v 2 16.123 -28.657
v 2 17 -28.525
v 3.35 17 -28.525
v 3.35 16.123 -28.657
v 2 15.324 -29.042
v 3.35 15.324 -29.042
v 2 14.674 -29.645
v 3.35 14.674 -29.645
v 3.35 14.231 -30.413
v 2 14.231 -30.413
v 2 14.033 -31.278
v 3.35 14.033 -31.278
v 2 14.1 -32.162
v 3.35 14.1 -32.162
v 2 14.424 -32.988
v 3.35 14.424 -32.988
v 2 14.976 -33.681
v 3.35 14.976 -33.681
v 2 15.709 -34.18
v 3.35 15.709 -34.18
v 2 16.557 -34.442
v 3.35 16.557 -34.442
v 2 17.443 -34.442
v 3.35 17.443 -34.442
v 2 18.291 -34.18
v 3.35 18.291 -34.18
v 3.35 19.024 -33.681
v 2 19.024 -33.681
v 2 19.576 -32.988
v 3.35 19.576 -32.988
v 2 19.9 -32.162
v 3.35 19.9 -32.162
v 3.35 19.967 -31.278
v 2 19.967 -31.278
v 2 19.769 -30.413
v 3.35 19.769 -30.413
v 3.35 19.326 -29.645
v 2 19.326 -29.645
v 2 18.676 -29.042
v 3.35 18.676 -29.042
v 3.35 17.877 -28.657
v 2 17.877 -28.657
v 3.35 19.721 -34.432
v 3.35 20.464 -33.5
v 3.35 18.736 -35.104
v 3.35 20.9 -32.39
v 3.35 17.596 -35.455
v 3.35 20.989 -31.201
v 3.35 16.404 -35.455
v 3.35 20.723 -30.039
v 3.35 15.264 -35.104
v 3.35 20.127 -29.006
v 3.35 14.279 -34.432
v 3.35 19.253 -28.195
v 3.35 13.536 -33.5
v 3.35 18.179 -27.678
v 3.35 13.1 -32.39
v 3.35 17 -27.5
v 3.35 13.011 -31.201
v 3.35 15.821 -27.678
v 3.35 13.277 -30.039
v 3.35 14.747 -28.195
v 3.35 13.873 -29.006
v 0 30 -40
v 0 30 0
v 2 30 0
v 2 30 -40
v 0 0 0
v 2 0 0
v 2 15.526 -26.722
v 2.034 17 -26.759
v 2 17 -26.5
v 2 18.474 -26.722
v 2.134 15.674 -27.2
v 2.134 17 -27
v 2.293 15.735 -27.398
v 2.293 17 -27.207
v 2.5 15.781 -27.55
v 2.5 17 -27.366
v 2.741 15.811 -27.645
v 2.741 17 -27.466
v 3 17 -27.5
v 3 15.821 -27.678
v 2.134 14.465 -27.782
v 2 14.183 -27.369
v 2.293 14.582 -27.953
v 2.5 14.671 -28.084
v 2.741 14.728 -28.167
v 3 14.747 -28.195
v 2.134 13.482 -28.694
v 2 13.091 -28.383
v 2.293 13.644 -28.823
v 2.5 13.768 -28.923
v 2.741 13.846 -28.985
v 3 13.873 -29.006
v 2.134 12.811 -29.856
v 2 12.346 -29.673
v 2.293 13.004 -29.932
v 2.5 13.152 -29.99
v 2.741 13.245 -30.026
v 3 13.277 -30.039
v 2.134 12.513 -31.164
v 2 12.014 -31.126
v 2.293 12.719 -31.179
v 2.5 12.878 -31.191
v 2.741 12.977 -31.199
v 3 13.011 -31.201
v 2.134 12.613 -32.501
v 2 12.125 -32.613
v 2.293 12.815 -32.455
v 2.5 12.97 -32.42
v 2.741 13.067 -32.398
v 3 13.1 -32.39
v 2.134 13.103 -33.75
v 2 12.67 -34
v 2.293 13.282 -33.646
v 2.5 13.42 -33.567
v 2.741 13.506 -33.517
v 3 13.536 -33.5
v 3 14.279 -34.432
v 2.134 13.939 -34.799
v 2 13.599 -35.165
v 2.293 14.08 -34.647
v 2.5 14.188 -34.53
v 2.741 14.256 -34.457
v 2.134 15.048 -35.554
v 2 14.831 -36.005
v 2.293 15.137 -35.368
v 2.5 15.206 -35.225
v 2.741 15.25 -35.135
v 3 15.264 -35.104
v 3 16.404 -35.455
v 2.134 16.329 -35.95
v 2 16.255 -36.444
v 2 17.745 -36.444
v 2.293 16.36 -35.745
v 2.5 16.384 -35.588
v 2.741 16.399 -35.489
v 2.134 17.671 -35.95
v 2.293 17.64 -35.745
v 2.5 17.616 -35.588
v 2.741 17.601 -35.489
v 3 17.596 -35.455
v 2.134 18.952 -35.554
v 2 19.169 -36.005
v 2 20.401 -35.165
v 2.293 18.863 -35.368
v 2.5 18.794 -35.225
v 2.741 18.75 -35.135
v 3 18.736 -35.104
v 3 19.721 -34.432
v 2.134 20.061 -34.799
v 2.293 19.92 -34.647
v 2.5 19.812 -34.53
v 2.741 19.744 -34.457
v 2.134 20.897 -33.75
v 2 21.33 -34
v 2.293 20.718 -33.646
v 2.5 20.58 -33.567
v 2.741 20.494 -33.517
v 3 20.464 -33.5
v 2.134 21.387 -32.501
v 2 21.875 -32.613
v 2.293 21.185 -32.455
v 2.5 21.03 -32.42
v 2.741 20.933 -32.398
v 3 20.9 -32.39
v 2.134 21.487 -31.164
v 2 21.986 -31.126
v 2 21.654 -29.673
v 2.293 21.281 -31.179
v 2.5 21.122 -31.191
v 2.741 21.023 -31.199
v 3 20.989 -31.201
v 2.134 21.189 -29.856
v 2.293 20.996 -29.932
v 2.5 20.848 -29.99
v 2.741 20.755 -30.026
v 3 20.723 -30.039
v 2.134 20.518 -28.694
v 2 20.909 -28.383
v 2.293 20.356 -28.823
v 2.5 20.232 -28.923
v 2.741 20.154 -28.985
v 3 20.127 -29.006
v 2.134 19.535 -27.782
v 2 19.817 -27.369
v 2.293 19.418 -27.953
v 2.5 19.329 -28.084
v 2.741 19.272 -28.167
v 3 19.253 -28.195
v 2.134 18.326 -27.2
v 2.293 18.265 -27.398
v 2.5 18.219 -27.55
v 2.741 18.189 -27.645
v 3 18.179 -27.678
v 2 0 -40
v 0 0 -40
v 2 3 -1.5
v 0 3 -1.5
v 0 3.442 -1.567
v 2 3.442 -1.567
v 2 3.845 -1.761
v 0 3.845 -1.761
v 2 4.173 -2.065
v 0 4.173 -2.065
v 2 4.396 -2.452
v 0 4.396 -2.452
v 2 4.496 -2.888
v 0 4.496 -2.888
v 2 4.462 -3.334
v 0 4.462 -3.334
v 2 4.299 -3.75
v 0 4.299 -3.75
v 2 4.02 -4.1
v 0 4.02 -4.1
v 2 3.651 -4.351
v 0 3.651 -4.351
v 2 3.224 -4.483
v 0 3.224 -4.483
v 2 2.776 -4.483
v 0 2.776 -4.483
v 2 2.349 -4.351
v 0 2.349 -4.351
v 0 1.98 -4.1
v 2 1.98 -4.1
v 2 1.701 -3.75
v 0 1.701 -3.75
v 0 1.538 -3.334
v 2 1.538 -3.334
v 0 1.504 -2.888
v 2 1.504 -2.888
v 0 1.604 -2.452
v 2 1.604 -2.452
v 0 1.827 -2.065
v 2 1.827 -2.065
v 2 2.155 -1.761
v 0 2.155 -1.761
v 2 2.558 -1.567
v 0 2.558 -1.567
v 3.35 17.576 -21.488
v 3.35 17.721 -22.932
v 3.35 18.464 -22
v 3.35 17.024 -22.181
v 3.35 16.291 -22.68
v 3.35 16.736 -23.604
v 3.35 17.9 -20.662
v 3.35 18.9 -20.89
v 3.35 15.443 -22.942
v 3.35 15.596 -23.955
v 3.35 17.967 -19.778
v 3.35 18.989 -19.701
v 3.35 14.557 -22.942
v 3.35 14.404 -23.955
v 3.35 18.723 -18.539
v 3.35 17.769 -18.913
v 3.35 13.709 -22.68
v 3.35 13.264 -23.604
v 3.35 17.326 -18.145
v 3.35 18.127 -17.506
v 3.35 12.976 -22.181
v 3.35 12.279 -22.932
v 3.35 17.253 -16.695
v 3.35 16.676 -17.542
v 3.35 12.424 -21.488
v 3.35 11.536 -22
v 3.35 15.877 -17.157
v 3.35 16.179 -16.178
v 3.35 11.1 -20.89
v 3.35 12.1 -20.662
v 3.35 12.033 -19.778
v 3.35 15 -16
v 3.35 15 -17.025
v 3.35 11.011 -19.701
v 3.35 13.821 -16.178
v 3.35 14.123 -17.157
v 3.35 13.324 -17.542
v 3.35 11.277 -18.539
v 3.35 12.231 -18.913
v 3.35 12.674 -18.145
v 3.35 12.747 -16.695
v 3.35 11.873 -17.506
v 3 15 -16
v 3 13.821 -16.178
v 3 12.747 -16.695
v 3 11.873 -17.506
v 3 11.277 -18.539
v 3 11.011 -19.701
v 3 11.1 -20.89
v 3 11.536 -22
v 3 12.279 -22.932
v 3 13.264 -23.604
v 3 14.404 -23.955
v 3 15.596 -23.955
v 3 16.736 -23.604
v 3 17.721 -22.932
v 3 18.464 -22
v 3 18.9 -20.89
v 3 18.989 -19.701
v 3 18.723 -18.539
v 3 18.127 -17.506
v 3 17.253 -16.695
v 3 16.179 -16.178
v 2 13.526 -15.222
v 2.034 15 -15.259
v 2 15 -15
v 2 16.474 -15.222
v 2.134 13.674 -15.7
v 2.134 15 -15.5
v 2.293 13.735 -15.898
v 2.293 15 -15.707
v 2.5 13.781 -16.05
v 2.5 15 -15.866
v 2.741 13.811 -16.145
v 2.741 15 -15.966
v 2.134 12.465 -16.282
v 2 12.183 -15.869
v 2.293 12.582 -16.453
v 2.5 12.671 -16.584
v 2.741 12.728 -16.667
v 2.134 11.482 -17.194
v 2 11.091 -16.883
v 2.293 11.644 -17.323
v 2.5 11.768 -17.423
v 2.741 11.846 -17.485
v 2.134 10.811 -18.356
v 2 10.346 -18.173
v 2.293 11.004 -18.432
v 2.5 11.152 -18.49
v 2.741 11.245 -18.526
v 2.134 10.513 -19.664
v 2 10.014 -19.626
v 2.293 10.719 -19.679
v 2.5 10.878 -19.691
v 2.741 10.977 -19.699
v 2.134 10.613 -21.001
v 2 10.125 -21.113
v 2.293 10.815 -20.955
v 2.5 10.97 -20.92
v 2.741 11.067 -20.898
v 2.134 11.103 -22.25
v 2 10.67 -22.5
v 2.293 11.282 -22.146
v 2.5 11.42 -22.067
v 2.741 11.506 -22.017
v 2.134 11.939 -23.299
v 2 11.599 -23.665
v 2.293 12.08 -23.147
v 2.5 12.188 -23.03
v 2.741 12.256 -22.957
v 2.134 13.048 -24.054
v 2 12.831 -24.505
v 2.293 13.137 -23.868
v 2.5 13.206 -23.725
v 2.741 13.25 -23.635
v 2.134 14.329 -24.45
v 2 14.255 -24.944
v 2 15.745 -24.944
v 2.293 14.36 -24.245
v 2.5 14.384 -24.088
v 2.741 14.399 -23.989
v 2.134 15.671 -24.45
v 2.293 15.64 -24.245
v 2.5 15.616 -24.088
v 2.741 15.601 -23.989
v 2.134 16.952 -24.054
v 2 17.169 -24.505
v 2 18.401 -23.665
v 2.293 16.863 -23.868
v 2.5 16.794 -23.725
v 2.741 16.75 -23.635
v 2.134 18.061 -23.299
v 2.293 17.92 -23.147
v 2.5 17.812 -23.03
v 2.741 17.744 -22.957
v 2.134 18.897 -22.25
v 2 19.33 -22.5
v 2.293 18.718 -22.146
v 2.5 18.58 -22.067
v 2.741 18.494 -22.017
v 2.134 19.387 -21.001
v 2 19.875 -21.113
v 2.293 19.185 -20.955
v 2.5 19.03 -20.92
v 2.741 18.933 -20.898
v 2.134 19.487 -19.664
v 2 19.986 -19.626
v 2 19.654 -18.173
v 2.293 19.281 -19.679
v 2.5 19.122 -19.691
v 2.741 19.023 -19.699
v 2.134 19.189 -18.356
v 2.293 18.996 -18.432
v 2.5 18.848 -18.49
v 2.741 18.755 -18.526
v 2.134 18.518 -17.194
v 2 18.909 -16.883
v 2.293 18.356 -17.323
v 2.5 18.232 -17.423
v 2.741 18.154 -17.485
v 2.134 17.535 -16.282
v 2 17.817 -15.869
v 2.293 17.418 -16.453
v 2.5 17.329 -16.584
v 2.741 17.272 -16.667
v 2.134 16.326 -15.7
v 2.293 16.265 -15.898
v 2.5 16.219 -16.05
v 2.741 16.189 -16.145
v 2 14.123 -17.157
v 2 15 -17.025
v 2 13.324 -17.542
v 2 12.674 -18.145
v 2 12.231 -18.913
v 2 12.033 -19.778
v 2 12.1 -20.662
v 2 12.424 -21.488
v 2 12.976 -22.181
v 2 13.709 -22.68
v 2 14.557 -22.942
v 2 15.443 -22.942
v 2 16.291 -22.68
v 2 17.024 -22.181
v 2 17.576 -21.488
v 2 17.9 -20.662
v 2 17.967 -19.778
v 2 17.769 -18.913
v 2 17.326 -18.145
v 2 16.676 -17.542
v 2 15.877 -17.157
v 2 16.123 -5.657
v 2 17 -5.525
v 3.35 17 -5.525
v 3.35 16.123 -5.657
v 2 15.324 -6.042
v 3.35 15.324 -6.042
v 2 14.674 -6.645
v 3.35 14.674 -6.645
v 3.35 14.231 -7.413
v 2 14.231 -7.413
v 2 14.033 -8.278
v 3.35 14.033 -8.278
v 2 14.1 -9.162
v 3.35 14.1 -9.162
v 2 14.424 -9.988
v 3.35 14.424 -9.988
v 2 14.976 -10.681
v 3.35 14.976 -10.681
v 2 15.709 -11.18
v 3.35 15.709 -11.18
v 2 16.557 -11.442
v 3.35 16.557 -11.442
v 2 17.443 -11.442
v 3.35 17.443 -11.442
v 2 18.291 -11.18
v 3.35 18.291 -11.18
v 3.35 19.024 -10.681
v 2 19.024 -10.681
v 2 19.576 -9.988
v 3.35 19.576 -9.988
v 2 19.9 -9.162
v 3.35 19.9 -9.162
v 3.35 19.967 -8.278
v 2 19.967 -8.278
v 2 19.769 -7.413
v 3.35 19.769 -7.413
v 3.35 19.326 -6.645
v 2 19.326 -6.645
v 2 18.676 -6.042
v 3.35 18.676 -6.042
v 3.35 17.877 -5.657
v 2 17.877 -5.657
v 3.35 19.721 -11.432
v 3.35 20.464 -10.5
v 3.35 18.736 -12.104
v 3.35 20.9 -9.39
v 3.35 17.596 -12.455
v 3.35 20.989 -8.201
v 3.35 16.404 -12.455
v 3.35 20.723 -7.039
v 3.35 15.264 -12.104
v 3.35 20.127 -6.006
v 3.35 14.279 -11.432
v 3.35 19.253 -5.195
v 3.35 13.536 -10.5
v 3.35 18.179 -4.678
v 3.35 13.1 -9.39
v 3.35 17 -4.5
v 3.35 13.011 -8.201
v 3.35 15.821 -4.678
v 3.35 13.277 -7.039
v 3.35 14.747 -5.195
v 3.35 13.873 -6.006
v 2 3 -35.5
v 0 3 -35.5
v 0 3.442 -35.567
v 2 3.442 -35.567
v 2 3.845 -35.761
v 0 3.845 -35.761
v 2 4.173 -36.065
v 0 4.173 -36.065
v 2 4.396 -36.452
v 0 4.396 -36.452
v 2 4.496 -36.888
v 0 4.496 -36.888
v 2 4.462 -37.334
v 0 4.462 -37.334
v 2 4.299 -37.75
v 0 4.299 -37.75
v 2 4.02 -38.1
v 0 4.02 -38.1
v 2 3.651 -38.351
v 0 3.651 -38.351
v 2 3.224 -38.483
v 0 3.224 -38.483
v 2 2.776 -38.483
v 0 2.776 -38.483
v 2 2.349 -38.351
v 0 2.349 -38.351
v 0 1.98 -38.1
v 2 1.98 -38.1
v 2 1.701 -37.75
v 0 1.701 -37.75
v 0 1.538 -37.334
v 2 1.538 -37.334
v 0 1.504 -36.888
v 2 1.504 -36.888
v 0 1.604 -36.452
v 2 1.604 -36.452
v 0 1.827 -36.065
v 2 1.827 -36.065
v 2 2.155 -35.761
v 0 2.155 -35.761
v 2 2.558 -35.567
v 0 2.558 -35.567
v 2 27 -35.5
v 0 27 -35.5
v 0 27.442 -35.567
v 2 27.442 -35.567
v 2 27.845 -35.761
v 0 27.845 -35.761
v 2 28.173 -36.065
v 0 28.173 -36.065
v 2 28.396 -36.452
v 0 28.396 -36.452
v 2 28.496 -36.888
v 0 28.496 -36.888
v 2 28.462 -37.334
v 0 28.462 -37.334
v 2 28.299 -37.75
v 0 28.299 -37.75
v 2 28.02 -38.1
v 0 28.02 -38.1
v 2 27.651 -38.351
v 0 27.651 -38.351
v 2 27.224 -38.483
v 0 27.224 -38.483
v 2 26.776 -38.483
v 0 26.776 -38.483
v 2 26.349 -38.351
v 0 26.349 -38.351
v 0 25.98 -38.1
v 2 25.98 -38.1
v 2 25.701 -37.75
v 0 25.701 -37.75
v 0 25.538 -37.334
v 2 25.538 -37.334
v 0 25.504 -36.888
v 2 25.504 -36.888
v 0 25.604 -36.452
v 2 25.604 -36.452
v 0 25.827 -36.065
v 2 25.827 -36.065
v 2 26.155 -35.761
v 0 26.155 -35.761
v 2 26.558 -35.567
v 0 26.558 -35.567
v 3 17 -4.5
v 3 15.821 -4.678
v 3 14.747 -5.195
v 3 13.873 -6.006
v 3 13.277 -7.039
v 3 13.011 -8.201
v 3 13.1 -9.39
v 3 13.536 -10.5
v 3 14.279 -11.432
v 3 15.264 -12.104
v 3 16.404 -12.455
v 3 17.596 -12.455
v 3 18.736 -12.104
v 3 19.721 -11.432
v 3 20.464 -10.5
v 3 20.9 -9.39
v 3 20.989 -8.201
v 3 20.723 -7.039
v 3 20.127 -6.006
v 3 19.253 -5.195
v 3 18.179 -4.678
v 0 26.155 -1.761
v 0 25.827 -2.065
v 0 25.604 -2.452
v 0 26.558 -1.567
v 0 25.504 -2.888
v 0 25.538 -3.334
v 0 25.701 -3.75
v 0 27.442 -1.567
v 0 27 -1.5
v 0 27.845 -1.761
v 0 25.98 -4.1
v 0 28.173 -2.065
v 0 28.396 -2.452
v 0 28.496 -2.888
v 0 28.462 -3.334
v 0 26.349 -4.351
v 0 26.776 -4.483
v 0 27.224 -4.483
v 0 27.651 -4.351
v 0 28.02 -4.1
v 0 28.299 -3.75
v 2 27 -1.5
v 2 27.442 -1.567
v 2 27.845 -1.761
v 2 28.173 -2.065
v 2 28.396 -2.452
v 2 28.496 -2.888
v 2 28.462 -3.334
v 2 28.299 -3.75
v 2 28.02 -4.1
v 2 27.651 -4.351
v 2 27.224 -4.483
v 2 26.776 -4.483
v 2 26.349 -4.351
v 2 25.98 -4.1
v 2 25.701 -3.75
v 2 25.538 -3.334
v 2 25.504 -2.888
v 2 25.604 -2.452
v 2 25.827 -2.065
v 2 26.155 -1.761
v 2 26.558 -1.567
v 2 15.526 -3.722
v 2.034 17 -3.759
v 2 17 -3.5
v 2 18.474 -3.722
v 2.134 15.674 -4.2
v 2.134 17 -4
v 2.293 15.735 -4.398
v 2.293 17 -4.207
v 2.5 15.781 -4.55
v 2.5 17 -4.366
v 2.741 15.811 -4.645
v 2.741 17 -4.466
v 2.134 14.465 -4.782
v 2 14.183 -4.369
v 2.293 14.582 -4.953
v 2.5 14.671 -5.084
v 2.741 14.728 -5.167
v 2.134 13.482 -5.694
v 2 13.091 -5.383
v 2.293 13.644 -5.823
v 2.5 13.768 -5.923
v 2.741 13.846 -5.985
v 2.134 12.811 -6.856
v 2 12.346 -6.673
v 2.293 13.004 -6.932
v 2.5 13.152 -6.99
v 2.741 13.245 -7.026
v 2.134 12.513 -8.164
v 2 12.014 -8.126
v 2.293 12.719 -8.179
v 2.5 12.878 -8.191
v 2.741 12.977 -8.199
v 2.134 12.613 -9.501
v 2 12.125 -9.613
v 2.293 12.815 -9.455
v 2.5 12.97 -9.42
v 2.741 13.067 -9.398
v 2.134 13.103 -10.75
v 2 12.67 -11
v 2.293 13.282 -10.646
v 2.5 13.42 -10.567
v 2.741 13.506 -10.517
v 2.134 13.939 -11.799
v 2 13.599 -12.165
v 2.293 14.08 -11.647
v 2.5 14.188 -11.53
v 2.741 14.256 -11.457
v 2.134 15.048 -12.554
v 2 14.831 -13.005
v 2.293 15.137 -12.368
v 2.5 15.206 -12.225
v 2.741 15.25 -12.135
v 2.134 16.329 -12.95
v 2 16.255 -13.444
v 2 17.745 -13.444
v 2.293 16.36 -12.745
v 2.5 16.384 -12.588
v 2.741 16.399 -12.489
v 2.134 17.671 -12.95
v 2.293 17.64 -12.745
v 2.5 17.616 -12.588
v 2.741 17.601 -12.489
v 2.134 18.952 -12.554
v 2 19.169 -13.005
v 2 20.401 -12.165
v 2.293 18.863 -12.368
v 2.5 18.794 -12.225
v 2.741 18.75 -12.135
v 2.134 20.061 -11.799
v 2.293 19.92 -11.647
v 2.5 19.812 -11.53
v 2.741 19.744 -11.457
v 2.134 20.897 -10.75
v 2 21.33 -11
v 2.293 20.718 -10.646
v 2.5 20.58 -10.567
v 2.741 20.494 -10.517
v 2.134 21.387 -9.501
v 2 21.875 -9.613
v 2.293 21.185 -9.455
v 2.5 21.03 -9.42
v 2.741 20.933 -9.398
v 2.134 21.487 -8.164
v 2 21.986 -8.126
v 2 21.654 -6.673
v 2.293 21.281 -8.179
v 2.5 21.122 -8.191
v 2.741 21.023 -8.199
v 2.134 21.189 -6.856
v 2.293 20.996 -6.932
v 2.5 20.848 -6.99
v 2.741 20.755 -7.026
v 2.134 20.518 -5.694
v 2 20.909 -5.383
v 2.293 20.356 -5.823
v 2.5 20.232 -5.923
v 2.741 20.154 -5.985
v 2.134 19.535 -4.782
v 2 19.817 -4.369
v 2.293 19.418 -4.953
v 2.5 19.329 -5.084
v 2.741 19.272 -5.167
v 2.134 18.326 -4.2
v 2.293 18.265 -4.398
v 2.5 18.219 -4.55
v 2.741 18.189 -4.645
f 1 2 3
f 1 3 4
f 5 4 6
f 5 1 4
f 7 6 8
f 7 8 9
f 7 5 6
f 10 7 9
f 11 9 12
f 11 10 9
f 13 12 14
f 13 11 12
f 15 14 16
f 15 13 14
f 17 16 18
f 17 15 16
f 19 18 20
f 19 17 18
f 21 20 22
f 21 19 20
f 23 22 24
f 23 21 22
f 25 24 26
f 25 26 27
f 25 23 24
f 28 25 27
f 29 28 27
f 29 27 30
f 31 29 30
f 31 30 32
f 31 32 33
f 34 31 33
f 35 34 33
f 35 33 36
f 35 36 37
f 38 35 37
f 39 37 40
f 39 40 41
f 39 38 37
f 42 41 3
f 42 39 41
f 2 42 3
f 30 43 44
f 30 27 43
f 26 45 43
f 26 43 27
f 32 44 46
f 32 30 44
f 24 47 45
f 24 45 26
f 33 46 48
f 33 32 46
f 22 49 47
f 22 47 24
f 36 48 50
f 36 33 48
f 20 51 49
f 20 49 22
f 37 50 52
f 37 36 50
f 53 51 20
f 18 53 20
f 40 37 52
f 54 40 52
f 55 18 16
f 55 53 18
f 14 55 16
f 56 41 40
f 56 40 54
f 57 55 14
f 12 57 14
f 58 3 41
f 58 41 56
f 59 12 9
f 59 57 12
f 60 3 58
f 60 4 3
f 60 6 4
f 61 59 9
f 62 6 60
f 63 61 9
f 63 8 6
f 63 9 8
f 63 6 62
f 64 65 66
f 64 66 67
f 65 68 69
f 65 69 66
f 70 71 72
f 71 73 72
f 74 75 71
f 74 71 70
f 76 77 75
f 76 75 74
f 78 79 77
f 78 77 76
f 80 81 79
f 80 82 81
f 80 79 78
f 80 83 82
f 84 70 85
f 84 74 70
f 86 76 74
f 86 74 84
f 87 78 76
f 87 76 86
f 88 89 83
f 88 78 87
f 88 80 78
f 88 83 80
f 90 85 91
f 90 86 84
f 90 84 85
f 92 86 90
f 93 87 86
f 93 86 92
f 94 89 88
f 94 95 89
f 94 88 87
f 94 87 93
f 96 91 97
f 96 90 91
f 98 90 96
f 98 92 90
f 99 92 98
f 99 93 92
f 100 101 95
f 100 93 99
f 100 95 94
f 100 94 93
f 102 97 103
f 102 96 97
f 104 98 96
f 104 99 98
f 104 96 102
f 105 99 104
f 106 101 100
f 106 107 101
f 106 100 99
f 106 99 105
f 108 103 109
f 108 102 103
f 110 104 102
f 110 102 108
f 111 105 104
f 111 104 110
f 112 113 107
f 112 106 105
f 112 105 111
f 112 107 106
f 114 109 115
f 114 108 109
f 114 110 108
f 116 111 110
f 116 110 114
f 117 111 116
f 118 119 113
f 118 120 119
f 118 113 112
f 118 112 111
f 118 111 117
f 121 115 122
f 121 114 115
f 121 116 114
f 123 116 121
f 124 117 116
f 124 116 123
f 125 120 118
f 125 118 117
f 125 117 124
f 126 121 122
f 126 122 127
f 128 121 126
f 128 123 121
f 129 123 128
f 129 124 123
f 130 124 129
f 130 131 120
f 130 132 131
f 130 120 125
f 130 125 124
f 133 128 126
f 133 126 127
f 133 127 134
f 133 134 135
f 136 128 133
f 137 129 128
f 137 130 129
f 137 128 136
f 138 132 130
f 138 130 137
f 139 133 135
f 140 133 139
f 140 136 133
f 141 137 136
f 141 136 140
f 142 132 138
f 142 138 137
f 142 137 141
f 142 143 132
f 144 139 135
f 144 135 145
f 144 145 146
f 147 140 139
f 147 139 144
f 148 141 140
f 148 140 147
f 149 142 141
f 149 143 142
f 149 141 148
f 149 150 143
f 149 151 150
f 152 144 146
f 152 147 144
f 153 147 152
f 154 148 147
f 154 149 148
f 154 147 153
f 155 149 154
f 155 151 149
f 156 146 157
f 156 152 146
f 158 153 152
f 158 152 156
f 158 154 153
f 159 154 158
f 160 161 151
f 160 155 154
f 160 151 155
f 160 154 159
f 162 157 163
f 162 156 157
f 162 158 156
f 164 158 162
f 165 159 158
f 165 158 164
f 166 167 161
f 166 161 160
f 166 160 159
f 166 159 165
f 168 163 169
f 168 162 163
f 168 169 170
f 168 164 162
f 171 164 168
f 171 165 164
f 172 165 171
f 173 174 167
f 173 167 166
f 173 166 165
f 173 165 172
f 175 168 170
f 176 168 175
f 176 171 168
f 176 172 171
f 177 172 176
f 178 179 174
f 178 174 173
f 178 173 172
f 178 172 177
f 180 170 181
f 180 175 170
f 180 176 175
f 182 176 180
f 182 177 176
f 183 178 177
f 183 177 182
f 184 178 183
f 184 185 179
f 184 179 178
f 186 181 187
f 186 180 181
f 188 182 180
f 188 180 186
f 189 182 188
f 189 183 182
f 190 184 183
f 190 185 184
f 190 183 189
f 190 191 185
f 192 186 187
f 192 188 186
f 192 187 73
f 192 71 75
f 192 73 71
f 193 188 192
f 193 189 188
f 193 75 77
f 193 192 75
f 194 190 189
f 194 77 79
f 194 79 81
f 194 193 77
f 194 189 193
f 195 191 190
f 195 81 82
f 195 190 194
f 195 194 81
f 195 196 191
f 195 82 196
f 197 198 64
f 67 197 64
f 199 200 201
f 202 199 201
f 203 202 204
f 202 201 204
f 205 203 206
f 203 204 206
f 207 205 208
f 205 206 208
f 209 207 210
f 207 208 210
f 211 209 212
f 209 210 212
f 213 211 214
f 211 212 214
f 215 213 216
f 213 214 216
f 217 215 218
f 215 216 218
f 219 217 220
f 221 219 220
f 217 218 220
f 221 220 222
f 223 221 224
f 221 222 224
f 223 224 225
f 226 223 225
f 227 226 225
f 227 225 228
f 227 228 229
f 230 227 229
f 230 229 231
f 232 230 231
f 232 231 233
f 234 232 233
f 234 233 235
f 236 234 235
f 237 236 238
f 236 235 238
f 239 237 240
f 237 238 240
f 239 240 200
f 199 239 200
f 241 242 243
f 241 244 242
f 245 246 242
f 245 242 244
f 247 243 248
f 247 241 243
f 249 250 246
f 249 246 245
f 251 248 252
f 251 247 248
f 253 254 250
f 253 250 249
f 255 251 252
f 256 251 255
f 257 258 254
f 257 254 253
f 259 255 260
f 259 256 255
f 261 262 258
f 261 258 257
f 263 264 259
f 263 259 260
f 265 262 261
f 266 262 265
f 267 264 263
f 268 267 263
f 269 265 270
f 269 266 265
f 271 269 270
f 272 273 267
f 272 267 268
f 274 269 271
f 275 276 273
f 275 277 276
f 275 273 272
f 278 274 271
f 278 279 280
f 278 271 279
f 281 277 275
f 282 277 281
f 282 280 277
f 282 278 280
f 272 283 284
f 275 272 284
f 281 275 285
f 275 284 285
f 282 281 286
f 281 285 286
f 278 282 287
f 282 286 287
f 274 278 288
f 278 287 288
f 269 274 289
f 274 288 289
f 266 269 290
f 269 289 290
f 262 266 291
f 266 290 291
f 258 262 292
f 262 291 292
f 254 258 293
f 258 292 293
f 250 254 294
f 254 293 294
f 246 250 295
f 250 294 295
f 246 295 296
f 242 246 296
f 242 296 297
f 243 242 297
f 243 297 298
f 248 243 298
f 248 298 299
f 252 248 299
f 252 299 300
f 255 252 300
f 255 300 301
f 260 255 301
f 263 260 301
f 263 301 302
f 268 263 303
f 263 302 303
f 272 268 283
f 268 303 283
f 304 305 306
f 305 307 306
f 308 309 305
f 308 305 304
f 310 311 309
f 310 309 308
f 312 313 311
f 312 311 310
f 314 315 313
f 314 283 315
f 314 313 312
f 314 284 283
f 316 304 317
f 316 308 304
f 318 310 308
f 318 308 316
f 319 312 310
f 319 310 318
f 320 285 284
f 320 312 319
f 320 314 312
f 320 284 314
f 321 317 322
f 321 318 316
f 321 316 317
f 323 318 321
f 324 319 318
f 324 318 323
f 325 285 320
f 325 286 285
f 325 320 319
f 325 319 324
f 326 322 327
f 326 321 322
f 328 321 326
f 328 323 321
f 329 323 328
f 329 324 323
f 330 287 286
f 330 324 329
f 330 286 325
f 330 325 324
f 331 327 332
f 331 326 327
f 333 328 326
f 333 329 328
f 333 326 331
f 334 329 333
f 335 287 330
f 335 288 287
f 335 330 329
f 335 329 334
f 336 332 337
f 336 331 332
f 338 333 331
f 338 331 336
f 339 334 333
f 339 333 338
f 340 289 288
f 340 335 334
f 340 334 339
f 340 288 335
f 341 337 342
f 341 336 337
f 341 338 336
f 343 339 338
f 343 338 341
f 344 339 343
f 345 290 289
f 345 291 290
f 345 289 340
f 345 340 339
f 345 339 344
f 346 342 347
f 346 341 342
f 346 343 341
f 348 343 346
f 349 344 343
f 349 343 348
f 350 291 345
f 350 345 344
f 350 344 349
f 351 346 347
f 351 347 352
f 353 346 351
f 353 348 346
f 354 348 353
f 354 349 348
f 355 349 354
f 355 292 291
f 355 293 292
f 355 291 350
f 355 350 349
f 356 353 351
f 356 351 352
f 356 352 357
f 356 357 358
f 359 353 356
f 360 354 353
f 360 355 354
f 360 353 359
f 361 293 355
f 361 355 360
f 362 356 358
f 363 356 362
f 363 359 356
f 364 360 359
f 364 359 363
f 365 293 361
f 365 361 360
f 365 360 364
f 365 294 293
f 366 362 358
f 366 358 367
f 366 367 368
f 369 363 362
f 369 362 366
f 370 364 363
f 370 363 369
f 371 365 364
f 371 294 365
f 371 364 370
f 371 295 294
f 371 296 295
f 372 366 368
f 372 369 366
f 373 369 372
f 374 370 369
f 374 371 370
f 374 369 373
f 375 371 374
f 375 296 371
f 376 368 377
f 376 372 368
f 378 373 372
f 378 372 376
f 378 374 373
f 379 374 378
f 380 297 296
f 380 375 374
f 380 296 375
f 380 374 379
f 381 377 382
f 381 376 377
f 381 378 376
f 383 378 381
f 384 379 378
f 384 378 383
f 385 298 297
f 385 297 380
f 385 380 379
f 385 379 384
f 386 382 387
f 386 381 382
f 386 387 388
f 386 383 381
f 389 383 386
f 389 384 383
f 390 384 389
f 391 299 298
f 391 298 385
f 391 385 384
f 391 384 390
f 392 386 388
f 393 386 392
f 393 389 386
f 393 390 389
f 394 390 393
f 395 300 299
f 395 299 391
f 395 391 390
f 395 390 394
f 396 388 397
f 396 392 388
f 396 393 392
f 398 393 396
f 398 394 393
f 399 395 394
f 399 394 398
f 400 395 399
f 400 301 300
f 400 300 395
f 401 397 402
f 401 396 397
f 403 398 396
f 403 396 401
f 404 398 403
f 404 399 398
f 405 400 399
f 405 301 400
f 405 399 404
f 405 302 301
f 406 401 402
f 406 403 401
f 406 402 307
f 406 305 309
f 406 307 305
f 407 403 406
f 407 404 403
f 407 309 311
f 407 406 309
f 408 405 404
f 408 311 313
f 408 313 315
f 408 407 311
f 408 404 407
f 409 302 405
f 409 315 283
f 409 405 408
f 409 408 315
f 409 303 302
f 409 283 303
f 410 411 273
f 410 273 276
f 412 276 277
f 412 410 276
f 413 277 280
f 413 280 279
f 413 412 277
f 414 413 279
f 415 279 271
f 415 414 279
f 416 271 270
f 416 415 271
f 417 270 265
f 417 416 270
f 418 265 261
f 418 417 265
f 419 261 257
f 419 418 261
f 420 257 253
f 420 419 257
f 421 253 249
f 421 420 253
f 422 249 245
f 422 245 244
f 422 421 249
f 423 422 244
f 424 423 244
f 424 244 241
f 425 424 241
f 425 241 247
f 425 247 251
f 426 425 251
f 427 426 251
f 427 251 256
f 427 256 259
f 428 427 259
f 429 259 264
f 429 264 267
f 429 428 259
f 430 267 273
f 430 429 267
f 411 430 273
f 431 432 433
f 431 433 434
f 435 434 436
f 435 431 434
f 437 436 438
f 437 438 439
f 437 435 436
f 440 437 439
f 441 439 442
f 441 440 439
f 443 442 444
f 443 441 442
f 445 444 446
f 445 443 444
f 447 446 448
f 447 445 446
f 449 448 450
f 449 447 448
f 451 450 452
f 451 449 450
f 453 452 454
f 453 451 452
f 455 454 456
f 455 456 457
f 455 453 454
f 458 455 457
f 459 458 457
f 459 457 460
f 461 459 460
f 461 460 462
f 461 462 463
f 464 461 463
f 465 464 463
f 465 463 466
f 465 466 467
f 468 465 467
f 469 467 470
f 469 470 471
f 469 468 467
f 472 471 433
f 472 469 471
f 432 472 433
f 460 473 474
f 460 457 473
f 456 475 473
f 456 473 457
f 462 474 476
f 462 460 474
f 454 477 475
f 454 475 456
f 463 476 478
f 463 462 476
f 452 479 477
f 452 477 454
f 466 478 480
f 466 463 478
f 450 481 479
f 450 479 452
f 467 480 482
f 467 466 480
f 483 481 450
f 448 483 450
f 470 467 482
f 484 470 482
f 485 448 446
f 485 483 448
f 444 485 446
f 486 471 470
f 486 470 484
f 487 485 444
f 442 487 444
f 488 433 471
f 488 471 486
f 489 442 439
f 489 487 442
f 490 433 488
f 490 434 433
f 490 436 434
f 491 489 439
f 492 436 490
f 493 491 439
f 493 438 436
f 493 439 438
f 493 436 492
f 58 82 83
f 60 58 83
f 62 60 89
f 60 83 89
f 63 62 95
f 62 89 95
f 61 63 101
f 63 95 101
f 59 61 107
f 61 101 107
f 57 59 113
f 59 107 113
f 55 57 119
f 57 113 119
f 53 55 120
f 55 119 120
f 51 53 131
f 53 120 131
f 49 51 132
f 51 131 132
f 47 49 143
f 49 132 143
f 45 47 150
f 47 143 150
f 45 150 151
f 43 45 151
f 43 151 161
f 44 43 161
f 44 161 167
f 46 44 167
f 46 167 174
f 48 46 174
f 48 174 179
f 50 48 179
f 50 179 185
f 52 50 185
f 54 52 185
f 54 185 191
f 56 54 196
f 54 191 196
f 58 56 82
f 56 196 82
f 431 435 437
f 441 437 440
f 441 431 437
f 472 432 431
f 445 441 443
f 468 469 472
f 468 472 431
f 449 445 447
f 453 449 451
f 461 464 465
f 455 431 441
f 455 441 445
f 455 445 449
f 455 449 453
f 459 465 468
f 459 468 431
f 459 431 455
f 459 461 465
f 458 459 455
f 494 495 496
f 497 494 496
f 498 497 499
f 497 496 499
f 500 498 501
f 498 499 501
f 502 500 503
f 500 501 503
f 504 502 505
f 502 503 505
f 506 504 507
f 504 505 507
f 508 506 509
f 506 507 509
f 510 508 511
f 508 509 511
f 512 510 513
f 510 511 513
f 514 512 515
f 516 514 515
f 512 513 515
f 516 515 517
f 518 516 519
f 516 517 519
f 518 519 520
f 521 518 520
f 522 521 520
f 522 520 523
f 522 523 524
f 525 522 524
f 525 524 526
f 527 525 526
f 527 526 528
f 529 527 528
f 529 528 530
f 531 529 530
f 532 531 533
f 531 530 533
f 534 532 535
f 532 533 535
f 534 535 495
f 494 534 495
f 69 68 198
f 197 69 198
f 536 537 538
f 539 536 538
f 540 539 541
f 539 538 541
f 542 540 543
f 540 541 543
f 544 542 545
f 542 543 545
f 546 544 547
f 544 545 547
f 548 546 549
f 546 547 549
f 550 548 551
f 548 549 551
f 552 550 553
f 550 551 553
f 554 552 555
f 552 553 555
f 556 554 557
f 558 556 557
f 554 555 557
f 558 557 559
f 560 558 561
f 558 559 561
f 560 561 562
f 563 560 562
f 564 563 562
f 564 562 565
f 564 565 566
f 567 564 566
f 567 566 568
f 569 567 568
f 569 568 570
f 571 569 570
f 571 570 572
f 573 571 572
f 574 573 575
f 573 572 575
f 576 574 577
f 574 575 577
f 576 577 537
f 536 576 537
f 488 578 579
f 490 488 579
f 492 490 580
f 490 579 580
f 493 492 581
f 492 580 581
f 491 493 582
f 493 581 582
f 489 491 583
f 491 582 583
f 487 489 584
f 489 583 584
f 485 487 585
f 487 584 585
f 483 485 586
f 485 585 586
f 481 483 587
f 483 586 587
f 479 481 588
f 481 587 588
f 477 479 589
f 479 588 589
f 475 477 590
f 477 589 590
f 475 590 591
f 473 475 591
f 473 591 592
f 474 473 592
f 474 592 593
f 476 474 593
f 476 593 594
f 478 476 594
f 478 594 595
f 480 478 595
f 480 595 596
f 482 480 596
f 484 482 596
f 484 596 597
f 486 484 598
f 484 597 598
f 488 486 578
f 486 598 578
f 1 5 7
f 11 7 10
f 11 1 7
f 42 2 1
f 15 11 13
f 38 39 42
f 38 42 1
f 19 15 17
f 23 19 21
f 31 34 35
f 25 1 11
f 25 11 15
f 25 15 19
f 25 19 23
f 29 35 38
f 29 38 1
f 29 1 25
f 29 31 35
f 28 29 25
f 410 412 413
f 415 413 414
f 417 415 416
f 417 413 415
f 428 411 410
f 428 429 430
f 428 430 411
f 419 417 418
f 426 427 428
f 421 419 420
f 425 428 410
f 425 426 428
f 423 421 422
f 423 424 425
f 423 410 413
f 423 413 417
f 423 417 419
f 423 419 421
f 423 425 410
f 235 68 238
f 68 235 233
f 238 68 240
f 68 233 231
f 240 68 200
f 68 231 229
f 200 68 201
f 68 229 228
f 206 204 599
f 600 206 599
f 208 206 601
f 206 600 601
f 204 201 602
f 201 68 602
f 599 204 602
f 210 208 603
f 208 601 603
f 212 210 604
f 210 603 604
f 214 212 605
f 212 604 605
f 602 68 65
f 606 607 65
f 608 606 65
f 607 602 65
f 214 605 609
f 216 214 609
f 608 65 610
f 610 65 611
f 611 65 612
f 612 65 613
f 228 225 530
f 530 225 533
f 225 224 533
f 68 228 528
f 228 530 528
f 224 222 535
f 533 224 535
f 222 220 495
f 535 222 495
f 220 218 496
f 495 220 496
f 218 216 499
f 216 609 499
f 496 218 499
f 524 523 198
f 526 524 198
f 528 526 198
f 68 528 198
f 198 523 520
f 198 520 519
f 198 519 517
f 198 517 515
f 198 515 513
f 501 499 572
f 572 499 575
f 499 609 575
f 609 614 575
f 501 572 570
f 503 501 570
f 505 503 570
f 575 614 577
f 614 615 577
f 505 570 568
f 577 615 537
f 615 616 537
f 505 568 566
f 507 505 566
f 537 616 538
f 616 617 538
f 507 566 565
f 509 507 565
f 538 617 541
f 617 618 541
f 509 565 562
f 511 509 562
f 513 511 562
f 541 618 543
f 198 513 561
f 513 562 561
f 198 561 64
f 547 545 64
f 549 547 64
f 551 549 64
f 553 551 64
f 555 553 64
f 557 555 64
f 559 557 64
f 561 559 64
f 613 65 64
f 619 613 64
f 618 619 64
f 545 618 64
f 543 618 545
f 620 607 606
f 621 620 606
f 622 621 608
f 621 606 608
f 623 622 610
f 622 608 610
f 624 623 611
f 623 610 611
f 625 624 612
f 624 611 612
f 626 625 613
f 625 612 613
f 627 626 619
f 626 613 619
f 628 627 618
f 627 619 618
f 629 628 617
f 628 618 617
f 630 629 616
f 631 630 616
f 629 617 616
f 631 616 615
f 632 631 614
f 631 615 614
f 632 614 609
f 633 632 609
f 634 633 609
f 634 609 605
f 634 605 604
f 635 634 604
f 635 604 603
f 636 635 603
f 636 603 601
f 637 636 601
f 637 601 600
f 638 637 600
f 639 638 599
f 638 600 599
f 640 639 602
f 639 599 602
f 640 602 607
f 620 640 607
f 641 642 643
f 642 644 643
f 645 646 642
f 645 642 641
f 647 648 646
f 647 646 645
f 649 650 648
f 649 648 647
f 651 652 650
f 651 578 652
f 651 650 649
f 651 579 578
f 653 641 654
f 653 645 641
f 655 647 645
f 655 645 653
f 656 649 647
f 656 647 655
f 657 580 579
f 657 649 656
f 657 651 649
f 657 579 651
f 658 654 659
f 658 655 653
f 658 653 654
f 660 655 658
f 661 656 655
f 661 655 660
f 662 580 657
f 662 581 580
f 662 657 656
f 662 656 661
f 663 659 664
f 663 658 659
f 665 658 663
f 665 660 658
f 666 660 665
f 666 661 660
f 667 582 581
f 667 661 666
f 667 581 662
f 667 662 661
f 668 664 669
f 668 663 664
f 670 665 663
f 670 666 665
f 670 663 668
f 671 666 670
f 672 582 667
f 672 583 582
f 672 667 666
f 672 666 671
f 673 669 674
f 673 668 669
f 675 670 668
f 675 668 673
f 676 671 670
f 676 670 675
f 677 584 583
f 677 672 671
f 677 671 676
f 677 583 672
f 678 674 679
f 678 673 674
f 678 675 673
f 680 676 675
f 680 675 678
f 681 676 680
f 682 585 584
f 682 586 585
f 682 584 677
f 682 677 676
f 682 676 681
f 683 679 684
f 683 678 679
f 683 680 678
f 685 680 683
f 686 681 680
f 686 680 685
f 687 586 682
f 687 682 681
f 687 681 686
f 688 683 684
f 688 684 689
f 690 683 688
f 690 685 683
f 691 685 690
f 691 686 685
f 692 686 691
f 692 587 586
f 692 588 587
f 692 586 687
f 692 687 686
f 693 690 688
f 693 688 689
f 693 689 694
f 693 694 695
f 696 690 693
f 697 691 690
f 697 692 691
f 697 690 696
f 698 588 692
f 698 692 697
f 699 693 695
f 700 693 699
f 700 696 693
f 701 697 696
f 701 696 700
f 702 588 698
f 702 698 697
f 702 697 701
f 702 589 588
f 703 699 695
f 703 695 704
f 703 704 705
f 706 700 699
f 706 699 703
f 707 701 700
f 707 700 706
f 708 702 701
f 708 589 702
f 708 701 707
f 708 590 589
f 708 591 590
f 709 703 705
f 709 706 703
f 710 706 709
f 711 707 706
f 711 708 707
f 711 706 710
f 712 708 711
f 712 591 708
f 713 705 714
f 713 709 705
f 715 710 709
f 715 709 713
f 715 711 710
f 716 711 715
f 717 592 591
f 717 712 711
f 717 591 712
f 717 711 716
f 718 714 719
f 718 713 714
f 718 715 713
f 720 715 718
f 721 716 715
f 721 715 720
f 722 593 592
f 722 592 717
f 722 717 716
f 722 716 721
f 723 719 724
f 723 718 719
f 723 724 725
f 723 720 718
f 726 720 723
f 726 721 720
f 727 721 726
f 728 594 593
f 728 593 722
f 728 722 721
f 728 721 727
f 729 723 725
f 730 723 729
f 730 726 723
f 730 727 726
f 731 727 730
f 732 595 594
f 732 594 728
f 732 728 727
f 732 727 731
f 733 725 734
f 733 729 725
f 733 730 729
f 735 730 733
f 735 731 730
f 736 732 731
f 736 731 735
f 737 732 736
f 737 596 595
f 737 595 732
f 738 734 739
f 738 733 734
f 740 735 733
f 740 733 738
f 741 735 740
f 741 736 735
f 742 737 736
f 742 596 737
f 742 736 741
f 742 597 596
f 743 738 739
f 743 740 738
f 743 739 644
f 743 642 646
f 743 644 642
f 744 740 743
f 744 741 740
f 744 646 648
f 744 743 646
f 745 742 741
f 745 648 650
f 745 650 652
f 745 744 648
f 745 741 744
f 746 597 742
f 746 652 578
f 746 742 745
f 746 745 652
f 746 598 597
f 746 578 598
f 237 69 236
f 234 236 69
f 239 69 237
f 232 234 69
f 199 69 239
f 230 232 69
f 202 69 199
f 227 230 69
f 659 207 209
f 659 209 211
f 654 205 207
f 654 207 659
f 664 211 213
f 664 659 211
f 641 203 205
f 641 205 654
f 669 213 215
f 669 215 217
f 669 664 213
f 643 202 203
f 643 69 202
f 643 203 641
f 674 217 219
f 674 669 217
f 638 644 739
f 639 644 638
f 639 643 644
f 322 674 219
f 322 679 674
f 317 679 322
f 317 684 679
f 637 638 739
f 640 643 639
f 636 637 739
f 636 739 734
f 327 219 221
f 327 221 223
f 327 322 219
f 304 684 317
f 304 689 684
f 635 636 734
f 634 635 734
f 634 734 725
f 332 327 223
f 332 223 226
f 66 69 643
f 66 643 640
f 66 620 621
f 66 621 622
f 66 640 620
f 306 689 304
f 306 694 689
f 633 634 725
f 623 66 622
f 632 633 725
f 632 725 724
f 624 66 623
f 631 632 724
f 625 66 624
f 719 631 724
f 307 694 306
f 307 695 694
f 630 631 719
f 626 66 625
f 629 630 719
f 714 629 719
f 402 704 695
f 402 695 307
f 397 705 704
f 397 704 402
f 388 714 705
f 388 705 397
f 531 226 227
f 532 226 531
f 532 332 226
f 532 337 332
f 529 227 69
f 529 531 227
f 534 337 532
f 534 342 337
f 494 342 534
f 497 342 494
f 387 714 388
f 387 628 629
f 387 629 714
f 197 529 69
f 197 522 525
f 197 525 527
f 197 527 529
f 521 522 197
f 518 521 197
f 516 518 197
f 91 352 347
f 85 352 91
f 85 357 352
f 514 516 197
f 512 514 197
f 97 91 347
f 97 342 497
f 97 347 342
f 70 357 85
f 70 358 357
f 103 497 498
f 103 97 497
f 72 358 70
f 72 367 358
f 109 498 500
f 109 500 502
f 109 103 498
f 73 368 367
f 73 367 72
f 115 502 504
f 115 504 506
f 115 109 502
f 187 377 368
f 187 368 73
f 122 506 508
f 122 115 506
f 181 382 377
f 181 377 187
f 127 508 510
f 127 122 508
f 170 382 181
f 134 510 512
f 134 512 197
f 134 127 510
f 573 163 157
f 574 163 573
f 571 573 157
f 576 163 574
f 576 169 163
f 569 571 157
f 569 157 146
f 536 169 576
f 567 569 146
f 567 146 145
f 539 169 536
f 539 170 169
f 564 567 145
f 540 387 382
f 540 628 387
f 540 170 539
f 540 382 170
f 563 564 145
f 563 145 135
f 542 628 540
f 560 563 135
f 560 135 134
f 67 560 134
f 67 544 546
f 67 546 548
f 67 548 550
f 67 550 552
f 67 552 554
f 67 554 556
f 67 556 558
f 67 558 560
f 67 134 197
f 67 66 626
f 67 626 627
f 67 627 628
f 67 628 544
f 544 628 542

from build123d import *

# Parameters (mm, degrees)
SKETCH2_W           = 40
SKETCH2_H           = 30
BOSS_EXTRUDE1_DEPTH = 2
SKETCH3_R           = 4
SKETCH3_R_2         = 2.975
BOSS_EXTRUDE2_DEPTH = 1.35
FILLET1_R           = 1
SKETCH4_R           = 1.5
CUT_EXTRUDE1_DEPTH  = 2


with BuildPart() as part:
    # Sketch2 → Boss-Extrude1 (new body)
    with BuildSketch(Plane(origin=(0, 0, 0), x_dir=(0, 0, -1), z_dir=(1, 0, 0))):
        with Locations((20, 15)):
            Rectangle(SKETCH2_W, SKETCH2_H)
    extrude(amount=BOSS_EXTRUDE1_DEPTH)

    # Sketch3 → Boss-Extrude2 (add)
    # profile 1 of 3: a face of its own
    with BuildSketch(Plane(origin=(2, 0, 0), x_dir=(0, 0, -1), z_dir=(1, 0, 0))):
        with Locations(Location((8.5, 17, 0), (0, 0, 180))):
            Circle(SKETCH3_R)
        with Locations(Location((8.5, 17, 0), (0, 0, 180))):
            Circle(SKETCH3_R_2, mode=Mode.SUBTRACT)
    # profile 2 of 3: a face of its own
    with BuildSketch(Plane(origin=(2, 0, 0), x_dir=(0, 0, -1), z_dir=(1, 0, 0))):
        with Locations(Location((20, 15, 0), (0, 0, 180))):
            Circle(SKETCH3_R)
        with Locations(Location((20, 15, 0), (0, 0, 180))):
            Circle(SKETCH3_R_2, mode=Mode.SUBTRACT)
    # profile 3 of 3: a face of its own
    with BuildSketch(Plane(origin=(2, 0, 0), x_dir=(0, 0, -1), z_dir=(1, 0, 0))):
        with Locations(Location((31.5, 17, 0), (0, 0, 180))):
            Circle(SKETCH3_R)
        with Locations(Location((31.5, 17, 0), (0, 0, 180))):
            Circle(SKETCH3_R_2, mode=Mode.SUBTRACT)
    extrude(amount=BOSS_EXTRUDE2_DEPTH)

    # Fillet1
    fillet1_edges = [part.edges().sort_by_distance(p)[0] for p in [
        (2, 17, -12.5),
        (2, 15, -24),
        (2, 17, -35.5),
    ]]
    fillet(fillet1_edges, radius=FILLET1_R)

    # Sketch4 → Cut-Extrude1 (cut)
    with BuildSketch(Plane.ZY):
        with Locations((-37, 27)):
            Circle(SKETCH4_R)
        with Locations((-3, 27)):
            Circle(SKETCH4_R)
        with Locations((-37, 3)):
            Circle(SKETCH4_R)
        with Locations((-3, 3)):
            Circle(SKETCH4_R)
    extrude(amount=-CUT_EXTRUDE1_DEPTH, mode=Mode.SUBTRACT)


solid = part.part
